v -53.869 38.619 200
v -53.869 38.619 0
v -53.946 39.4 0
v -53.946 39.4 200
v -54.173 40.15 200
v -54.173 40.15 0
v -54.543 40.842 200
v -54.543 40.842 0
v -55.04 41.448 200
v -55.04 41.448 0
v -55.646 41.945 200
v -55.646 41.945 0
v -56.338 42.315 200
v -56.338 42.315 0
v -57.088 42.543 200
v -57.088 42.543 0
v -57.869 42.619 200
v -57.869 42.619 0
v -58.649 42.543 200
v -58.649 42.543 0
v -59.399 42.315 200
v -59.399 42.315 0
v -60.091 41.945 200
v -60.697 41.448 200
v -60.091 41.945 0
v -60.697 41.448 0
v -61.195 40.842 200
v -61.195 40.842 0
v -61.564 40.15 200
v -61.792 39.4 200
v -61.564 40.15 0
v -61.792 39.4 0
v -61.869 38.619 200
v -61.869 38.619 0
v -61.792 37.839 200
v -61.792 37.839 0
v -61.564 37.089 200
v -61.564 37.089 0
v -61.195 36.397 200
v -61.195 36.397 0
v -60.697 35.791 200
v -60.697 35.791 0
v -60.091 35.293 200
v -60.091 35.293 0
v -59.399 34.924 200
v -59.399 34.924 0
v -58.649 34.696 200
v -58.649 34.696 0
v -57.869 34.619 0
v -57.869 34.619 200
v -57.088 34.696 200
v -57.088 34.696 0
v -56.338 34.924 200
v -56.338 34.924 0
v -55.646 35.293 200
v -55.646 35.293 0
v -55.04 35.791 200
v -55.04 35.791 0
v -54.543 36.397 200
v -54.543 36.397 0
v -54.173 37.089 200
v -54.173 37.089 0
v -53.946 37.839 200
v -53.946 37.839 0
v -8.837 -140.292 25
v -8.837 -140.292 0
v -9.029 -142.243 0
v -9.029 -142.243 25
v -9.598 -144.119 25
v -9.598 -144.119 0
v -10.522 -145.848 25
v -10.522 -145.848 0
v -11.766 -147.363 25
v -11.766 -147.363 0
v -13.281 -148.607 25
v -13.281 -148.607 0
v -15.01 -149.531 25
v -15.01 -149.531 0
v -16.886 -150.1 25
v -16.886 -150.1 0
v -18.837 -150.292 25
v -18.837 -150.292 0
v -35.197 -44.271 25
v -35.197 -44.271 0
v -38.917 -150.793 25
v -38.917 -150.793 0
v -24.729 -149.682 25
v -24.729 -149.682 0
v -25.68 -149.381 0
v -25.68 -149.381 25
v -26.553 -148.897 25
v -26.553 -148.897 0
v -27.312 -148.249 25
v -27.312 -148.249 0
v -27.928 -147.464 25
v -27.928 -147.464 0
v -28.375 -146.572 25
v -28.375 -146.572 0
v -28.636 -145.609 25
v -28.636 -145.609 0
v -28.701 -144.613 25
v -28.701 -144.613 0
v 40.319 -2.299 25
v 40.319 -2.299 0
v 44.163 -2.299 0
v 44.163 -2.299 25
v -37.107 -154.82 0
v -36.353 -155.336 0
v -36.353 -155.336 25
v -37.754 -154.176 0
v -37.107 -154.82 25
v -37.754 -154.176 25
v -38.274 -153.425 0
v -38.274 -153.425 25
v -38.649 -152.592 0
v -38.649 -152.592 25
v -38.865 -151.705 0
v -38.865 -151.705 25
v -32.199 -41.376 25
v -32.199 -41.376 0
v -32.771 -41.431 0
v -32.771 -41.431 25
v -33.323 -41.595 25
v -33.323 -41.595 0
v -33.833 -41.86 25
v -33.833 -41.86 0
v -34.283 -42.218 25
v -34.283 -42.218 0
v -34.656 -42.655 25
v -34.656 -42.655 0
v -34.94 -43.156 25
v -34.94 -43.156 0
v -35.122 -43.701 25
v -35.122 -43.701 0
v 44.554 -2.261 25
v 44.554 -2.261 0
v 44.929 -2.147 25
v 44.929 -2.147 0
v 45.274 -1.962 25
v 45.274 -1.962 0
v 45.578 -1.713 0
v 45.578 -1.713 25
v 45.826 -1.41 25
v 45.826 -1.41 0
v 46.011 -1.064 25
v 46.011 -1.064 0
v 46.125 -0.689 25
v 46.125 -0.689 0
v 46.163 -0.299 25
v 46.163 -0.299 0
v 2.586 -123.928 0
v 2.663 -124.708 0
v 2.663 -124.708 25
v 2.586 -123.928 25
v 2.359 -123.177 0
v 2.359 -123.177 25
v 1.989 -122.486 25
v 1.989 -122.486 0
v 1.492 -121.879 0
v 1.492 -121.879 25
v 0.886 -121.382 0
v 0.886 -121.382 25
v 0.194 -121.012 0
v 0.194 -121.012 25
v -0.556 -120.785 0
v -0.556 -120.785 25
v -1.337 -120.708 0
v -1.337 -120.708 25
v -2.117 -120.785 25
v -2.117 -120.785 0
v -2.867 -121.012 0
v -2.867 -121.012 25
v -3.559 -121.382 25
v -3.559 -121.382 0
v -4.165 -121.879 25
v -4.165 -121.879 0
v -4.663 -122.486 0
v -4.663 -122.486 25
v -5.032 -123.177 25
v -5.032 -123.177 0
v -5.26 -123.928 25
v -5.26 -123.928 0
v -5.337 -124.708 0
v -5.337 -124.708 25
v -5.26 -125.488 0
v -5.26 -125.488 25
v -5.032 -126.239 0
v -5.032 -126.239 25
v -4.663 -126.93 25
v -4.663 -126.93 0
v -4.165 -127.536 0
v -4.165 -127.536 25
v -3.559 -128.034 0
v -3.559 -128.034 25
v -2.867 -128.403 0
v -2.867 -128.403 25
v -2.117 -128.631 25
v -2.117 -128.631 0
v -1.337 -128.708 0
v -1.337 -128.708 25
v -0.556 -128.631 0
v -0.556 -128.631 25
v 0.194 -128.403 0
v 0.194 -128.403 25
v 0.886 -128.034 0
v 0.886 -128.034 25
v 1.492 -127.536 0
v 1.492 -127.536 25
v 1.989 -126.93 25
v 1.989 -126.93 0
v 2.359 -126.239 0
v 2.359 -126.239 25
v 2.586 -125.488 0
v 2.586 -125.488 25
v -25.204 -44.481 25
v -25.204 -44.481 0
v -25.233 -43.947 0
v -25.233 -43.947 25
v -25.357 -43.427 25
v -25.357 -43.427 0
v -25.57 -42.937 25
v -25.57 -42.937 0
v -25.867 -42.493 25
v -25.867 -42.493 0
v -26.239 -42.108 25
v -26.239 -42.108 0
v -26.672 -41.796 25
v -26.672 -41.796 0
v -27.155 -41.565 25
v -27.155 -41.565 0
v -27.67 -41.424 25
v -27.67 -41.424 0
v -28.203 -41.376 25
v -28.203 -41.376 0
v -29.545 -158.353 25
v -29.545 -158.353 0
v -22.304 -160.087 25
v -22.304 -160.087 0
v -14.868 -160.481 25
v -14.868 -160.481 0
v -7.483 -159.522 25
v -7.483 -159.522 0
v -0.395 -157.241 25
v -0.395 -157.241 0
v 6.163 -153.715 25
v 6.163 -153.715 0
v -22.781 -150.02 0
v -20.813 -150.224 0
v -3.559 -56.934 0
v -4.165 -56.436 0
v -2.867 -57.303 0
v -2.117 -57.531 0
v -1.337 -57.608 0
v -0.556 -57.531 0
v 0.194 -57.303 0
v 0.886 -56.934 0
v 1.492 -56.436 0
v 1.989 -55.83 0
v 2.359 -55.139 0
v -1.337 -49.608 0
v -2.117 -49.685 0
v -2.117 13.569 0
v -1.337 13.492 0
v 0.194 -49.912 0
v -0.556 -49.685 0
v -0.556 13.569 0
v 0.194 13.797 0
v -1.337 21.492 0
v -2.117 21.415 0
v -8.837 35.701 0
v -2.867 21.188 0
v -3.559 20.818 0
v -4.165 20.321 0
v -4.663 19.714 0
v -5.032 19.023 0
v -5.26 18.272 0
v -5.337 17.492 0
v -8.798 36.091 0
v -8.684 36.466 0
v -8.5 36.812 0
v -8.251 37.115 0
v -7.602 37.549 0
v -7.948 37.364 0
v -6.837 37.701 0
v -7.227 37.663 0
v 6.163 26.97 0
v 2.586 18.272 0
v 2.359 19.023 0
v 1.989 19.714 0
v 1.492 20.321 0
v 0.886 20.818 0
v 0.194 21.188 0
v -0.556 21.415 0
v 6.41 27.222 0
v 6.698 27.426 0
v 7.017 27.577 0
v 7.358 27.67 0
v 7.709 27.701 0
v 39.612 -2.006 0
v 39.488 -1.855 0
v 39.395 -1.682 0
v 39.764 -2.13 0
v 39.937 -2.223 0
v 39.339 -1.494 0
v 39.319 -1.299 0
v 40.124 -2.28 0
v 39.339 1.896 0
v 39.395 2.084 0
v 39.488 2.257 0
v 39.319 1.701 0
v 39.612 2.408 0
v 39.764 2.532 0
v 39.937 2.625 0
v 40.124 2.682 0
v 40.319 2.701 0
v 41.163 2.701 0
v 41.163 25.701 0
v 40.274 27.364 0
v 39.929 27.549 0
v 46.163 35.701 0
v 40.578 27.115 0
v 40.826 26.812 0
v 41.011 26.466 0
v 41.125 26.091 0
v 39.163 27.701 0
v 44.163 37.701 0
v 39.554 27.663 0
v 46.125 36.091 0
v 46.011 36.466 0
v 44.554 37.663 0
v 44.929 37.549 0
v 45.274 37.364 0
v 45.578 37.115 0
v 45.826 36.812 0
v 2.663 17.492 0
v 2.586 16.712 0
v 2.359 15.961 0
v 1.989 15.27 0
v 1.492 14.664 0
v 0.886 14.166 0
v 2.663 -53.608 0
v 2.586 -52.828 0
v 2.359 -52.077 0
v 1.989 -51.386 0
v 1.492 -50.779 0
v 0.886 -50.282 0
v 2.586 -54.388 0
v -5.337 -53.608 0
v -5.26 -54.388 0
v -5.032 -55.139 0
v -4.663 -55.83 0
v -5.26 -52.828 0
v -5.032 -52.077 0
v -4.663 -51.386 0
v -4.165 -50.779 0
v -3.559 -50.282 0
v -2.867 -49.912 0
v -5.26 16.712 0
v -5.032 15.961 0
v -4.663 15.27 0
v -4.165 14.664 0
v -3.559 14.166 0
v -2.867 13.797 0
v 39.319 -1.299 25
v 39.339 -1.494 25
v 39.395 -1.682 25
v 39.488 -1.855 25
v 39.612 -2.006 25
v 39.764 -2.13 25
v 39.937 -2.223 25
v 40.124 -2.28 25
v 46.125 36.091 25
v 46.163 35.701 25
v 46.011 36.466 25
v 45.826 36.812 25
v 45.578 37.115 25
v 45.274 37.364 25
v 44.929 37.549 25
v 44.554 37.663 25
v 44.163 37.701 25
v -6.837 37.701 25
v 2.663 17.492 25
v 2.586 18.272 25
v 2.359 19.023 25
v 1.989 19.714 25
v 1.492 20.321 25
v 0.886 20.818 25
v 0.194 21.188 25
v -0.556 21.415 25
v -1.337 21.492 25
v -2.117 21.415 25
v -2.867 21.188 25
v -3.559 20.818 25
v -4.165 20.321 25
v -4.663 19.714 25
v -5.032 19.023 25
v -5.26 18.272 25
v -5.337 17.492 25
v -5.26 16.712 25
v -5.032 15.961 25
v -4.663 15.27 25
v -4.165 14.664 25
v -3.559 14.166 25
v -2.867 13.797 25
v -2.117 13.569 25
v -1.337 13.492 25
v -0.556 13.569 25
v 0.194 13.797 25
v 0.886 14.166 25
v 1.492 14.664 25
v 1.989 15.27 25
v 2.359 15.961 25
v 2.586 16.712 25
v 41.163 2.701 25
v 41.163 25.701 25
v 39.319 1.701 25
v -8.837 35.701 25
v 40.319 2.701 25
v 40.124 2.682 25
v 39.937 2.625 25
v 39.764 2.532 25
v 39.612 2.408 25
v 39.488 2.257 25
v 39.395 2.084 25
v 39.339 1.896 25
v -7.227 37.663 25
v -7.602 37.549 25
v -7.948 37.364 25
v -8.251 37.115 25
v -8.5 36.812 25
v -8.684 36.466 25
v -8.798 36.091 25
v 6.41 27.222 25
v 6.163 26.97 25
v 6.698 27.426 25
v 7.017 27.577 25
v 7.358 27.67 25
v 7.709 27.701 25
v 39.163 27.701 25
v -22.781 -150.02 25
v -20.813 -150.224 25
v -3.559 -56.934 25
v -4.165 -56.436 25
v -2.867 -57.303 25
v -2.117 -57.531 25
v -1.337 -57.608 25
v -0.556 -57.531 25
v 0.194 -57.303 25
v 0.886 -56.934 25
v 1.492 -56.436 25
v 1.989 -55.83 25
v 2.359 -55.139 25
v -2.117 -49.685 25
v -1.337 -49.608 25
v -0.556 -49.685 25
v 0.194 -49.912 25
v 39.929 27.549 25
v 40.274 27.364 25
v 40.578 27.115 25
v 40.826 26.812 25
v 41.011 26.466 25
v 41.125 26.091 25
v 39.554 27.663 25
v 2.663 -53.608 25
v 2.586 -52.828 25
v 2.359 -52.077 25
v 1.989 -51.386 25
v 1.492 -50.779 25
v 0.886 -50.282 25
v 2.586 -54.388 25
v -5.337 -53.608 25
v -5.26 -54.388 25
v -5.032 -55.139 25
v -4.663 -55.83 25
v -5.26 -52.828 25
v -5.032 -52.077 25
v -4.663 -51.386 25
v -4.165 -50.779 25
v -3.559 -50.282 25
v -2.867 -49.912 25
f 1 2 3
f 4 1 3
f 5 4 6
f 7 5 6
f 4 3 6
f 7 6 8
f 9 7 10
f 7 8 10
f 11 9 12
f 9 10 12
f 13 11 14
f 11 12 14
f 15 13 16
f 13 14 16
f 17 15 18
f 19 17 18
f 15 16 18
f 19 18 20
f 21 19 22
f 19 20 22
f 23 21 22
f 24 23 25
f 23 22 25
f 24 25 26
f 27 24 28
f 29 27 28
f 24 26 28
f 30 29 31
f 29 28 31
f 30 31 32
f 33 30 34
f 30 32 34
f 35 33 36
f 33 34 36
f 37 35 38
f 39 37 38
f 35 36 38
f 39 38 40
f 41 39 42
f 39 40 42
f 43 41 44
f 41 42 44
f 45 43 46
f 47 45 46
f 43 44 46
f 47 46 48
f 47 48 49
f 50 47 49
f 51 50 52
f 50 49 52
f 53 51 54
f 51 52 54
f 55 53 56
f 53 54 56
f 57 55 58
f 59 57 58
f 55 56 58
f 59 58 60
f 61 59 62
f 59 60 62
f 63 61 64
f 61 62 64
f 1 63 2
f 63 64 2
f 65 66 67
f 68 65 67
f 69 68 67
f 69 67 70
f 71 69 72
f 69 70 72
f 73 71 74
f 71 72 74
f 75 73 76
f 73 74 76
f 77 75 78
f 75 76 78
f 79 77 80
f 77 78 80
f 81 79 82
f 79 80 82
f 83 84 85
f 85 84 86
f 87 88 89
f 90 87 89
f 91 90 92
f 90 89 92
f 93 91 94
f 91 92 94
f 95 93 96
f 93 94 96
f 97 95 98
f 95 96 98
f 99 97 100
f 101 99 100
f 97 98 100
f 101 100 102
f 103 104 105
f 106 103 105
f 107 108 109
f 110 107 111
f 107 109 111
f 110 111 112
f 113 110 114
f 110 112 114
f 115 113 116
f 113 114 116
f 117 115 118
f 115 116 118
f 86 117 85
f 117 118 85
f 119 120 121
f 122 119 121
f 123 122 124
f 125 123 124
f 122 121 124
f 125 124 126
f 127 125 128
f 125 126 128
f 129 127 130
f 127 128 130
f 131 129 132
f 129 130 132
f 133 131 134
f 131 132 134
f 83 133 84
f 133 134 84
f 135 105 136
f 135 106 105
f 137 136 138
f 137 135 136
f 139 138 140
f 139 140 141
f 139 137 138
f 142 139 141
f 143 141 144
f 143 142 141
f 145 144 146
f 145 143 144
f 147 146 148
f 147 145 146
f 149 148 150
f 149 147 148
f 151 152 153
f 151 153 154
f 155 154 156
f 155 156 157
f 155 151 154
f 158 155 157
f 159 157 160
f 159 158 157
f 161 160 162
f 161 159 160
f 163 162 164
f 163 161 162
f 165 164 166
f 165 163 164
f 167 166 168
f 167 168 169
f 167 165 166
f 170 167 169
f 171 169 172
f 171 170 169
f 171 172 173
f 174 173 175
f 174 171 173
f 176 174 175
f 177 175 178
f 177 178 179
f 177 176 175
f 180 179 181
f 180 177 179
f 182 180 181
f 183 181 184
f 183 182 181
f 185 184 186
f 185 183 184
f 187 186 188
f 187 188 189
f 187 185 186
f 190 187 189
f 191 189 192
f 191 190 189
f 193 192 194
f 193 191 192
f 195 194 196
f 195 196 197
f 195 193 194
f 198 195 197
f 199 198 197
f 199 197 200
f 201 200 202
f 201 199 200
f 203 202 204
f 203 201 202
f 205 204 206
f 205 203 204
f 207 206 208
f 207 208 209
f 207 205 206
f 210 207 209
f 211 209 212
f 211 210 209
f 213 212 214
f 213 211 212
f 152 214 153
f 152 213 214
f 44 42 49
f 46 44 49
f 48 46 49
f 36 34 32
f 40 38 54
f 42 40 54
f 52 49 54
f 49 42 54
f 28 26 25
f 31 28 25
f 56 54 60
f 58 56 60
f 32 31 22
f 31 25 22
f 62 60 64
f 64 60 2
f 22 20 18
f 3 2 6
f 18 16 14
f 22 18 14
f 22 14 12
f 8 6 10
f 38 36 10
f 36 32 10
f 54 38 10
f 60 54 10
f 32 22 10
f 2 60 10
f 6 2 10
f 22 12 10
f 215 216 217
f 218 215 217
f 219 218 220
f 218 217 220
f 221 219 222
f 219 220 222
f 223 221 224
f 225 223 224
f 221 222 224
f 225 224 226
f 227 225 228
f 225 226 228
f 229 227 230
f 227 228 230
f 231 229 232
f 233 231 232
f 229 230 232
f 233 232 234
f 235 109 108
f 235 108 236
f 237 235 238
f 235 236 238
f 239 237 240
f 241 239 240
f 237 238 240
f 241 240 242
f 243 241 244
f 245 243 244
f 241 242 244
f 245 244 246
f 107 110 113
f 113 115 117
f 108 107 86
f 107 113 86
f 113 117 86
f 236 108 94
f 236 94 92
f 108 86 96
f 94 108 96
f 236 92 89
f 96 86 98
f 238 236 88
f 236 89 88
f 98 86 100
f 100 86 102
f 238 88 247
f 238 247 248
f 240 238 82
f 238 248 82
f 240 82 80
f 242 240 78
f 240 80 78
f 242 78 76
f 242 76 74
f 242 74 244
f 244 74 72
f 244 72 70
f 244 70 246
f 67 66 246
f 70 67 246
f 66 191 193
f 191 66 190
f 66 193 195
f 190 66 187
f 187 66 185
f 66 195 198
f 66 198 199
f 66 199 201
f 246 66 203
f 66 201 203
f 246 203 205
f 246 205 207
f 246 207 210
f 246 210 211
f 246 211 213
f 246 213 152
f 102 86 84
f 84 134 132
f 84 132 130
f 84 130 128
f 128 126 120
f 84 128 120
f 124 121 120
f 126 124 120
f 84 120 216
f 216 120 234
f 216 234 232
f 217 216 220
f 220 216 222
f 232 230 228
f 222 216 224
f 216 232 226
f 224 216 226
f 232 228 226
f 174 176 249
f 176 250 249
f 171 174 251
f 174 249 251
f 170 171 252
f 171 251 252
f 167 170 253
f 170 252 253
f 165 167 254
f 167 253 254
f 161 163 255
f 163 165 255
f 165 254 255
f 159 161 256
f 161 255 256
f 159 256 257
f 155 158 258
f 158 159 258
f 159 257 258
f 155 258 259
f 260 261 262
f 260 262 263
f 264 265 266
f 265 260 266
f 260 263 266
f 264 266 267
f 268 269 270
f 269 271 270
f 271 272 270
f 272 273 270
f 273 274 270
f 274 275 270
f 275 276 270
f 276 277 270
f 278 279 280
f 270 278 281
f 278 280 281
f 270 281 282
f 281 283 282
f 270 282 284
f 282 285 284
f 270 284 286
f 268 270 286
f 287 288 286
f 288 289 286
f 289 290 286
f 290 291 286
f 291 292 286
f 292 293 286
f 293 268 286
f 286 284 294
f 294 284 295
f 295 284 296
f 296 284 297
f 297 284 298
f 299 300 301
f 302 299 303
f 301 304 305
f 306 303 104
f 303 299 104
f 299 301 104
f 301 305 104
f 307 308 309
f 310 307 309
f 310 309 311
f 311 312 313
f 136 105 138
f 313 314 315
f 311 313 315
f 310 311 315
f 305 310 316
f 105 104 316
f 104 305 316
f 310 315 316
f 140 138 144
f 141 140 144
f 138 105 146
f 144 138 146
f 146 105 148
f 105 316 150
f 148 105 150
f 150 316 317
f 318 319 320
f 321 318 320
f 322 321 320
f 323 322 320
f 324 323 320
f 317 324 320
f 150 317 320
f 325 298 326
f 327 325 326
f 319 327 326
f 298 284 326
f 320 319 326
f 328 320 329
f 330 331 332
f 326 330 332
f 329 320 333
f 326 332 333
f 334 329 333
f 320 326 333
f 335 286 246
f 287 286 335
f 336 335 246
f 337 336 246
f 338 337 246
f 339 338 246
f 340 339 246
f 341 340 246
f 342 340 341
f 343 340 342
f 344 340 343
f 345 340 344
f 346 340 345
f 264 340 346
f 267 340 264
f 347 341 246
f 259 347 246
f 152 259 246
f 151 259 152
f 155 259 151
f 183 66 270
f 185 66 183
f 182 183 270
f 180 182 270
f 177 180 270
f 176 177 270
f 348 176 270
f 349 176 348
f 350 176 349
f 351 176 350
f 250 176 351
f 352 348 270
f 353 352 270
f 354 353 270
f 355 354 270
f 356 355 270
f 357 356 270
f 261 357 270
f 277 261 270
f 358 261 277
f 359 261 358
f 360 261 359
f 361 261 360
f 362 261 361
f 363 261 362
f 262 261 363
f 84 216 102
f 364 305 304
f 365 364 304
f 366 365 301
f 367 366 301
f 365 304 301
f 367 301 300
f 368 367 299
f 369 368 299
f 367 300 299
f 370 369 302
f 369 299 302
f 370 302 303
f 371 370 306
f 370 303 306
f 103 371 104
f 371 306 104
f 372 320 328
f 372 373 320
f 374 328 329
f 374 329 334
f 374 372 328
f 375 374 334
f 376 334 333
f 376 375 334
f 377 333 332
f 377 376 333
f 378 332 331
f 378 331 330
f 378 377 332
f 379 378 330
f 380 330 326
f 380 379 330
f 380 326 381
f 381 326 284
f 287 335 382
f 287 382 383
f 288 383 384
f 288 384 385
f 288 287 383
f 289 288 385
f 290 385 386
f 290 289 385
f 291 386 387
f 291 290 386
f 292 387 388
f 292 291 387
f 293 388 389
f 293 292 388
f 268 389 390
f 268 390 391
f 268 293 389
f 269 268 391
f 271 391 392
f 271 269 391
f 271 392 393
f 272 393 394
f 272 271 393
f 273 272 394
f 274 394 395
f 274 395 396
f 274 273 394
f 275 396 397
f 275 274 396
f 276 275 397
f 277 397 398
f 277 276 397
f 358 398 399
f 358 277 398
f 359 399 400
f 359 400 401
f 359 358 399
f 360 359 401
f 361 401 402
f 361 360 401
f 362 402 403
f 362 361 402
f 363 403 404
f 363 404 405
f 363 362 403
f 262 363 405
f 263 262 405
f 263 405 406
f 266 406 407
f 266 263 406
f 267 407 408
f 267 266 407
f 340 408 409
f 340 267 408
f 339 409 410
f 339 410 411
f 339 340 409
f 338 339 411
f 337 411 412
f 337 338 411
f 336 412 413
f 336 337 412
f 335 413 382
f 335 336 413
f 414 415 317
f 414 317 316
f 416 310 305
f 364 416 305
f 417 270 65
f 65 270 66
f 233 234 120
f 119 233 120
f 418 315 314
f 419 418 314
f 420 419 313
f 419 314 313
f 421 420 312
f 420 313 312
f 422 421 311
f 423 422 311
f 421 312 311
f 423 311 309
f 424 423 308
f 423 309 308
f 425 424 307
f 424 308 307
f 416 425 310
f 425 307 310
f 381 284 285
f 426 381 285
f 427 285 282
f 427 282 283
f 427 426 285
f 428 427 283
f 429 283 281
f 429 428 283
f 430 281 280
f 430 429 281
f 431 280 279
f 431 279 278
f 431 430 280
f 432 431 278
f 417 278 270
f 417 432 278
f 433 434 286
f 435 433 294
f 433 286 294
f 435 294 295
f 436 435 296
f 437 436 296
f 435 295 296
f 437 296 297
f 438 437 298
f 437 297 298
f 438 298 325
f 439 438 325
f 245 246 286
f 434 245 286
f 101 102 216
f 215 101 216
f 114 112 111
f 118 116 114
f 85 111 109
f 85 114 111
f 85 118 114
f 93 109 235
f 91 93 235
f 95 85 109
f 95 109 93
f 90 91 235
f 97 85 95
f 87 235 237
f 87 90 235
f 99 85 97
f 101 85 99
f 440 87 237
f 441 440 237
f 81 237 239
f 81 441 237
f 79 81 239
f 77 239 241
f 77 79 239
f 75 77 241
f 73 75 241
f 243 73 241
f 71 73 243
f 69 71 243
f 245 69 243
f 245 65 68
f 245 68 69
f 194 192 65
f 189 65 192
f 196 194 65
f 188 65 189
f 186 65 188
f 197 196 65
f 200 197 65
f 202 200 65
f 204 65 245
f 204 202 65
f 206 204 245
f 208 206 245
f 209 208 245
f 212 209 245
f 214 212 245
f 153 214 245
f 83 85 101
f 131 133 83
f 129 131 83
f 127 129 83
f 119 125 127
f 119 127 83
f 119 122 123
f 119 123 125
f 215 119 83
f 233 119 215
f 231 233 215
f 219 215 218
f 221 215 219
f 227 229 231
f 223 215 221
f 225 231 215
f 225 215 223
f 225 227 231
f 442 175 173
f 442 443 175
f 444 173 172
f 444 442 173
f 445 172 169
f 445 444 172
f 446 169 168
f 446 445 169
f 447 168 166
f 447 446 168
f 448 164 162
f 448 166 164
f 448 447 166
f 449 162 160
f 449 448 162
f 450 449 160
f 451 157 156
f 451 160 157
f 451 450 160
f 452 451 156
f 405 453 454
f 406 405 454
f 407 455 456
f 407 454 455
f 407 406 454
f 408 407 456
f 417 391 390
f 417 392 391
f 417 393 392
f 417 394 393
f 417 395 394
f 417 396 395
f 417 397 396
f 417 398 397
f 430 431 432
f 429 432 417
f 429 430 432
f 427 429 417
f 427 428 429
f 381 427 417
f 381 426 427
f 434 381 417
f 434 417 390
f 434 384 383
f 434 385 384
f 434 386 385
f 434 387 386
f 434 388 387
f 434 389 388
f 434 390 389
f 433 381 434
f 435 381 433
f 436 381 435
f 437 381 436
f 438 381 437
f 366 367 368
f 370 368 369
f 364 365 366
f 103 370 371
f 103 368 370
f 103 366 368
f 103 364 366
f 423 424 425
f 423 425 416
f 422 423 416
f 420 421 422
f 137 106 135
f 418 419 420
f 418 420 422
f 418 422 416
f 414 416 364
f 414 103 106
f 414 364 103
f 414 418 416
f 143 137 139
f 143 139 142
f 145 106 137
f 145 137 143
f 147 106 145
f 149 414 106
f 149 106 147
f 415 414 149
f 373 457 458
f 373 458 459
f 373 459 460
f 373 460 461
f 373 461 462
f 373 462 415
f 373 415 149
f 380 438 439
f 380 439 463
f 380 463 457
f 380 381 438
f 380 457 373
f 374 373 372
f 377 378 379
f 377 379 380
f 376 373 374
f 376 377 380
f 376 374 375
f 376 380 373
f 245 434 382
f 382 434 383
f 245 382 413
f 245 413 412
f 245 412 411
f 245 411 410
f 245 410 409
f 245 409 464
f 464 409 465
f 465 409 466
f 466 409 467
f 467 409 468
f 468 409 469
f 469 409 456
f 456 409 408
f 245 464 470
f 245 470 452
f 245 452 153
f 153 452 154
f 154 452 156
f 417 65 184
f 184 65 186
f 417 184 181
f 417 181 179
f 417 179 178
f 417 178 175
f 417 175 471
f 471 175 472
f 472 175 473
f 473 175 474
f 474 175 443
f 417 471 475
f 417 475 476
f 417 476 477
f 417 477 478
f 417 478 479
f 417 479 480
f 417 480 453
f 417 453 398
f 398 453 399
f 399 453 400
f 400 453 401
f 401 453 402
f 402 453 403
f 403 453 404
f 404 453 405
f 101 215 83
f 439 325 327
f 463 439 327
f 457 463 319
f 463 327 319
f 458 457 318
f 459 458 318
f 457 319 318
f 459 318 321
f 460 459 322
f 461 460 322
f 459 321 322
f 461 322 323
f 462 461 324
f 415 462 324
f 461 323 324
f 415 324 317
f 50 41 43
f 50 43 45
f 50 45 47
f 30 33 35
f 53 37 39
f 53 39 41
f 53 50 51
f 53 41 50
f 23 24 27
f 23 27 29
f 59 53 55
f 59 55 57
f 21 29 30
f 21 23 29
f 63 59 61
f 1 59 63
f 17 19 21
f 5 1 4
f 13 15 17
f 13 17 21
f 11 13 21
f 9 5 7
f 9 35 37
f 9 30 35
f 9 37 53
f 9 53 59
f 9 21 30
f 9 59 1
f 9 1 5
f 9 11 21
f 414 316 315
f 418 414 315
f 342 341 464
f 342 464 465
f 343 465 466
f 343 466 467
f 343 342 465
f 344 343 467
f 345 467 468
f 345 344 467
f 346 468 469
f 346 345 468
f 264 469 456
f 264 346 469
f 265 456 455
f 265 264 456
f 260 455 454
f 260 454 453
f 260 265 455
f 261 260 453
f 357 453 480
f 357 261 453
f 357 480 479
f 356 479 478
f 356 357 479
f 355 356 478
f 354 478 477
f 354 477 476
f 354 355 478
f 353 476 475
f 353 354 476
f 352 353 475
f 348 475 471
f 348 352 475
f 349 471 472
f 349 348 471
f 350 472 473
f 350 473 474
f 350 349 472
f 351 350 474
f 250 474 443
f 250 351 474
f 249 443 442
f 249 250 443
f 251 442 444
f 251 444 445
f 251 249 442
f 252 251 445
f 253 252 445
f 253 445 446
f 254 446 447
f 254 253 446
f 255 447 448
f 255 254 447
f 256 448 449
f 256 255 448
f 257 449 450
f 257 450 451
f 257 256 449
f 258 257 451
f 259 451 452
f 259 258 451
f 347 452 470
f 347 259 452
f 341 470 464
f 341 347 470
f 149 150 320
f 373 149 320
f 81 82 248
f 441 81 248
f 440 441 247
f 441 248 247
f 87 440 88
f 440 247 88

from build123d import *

# Parameters (mm, degrees)
F0_R     = 4
F1_DEPTH = 25
F2_R     = 2
F3_R     = 5
F4_R     = 4
F5_DEPTH = 200


with BuildPart() as f1:
    # F0 (on Top) → F1 (new body)
    with BuildSketch(Plane.XY):
        with BuildLine():
            ThreePointArc((6.16334, 26.969844), (6.854238, 27.508997), (7.709316, 27.701003))
            Line((7.709316, 27.701003), (39.16334, 27.701003))
            ThreePointArc((39.16334, 27.701003), (40.577554, 27.115217), (41.16334, 25.701003))
            Line((41.16334, 25.701003), (41.16334, 2.701003))
            Line((41.16334, 2.701003), (40.319335, 2.701003))
            ThreePointArc((40.319335, 2.701003), (39.612228, 2.40811), (39.319335, 1.701003))
            Line((39.319335, 1.701003), (39.319335, -1.298997))
            ThreePointArc((39.319335, -1.298997), (39.612228, -2.006104), (40.319335, -2.298997))
            Line((40.319335, -2.298997), (41.16334, -2.298997))
            Line((41.16334, -2.298997), (46.16334, -2.298997))
            Line((46.16334, -2.298997), (46.16334, 37.701003))
            Line((46.16334, 37.701003), (-8.83666, 37.701003))
            Line((-8.83666, 37.701003), (-8.83666, -140.291969))
            ThreePointArc((-8.83666, -140.291969), (-11.765592, -147.363037), (-18.83666, -150.291969))
            ThreePointArc((-18.83666, -150.291969), (-21.798647, -150.138949), (-24.729096, -149.681516))
            ThreePointArc((-24.729096, -149.681516), (-27.63957, -147.871874), (-28.701057, -144.613207))
            Line((-28.701057, -144.613207), (-25.204357, -44.480815))
            ThreePointArc((-25.204357, -44.480815), (-26.04451, -42.292142), (-28.202529, -41.376117))
            Line((-28.202529, -41.376117), (-32.198872, -41.376117))
            ThreePointArc((-32.198872, -41.376117), (-34.282847, -42.218098), (-35.197044, -44.271418))
            Line((-35.197044, -44.271418), (-39.018888, -153.714714))
            ThreePointArc((-39.018888, -153.714714), (-16.427774, -160.51035), (6.16334, -153.714714))
            Line((6.16334, -153.714714), (6.16334, 26.969844))
        make_face()
        with Locations((-1.33666, -124.707893)):
            Circle(F0_R, mode=Mode.SUBTRACT)
        with Locations((-1.33666, -53.607893)):
            Circle(F0_R, mode=Mode.SUBTRACT)
        with Locations((-1.33666, 17.492107)):
            Circle(F0_R, mode=Mode.SUBTRACT)
    extrude(amount=F1_DEPTH)

    # F2
    f2_edges = [f1.edges().sort_by_distance(p)[0] for p in [
        (-8.83666, 37.701003, 12.5),
        (46.16334, 37.701003, 12.5),
        (46.16334, -2.298997, 12.5),
    ]]
    fillet(f2_edges, radius=F2_R)

    # F3
    f3_edges = [f1.edges().sort_by_distance(p)[0] for p in [
        (-39.018888, -153.714714, 12.5),
    ]]
    fillet(f3_edges, radius=F3_R)


with BuildPart() as f5:
    # F4 (on Top) → F5 (new body)
    with BuildSketch(Plane.XY):
        with Locations((-57.868689, 38.619373)):
            Circle(F4_R)
    extrude(amount=F5_DEPTH)


solid = Compound([f1.part, f5.part])
